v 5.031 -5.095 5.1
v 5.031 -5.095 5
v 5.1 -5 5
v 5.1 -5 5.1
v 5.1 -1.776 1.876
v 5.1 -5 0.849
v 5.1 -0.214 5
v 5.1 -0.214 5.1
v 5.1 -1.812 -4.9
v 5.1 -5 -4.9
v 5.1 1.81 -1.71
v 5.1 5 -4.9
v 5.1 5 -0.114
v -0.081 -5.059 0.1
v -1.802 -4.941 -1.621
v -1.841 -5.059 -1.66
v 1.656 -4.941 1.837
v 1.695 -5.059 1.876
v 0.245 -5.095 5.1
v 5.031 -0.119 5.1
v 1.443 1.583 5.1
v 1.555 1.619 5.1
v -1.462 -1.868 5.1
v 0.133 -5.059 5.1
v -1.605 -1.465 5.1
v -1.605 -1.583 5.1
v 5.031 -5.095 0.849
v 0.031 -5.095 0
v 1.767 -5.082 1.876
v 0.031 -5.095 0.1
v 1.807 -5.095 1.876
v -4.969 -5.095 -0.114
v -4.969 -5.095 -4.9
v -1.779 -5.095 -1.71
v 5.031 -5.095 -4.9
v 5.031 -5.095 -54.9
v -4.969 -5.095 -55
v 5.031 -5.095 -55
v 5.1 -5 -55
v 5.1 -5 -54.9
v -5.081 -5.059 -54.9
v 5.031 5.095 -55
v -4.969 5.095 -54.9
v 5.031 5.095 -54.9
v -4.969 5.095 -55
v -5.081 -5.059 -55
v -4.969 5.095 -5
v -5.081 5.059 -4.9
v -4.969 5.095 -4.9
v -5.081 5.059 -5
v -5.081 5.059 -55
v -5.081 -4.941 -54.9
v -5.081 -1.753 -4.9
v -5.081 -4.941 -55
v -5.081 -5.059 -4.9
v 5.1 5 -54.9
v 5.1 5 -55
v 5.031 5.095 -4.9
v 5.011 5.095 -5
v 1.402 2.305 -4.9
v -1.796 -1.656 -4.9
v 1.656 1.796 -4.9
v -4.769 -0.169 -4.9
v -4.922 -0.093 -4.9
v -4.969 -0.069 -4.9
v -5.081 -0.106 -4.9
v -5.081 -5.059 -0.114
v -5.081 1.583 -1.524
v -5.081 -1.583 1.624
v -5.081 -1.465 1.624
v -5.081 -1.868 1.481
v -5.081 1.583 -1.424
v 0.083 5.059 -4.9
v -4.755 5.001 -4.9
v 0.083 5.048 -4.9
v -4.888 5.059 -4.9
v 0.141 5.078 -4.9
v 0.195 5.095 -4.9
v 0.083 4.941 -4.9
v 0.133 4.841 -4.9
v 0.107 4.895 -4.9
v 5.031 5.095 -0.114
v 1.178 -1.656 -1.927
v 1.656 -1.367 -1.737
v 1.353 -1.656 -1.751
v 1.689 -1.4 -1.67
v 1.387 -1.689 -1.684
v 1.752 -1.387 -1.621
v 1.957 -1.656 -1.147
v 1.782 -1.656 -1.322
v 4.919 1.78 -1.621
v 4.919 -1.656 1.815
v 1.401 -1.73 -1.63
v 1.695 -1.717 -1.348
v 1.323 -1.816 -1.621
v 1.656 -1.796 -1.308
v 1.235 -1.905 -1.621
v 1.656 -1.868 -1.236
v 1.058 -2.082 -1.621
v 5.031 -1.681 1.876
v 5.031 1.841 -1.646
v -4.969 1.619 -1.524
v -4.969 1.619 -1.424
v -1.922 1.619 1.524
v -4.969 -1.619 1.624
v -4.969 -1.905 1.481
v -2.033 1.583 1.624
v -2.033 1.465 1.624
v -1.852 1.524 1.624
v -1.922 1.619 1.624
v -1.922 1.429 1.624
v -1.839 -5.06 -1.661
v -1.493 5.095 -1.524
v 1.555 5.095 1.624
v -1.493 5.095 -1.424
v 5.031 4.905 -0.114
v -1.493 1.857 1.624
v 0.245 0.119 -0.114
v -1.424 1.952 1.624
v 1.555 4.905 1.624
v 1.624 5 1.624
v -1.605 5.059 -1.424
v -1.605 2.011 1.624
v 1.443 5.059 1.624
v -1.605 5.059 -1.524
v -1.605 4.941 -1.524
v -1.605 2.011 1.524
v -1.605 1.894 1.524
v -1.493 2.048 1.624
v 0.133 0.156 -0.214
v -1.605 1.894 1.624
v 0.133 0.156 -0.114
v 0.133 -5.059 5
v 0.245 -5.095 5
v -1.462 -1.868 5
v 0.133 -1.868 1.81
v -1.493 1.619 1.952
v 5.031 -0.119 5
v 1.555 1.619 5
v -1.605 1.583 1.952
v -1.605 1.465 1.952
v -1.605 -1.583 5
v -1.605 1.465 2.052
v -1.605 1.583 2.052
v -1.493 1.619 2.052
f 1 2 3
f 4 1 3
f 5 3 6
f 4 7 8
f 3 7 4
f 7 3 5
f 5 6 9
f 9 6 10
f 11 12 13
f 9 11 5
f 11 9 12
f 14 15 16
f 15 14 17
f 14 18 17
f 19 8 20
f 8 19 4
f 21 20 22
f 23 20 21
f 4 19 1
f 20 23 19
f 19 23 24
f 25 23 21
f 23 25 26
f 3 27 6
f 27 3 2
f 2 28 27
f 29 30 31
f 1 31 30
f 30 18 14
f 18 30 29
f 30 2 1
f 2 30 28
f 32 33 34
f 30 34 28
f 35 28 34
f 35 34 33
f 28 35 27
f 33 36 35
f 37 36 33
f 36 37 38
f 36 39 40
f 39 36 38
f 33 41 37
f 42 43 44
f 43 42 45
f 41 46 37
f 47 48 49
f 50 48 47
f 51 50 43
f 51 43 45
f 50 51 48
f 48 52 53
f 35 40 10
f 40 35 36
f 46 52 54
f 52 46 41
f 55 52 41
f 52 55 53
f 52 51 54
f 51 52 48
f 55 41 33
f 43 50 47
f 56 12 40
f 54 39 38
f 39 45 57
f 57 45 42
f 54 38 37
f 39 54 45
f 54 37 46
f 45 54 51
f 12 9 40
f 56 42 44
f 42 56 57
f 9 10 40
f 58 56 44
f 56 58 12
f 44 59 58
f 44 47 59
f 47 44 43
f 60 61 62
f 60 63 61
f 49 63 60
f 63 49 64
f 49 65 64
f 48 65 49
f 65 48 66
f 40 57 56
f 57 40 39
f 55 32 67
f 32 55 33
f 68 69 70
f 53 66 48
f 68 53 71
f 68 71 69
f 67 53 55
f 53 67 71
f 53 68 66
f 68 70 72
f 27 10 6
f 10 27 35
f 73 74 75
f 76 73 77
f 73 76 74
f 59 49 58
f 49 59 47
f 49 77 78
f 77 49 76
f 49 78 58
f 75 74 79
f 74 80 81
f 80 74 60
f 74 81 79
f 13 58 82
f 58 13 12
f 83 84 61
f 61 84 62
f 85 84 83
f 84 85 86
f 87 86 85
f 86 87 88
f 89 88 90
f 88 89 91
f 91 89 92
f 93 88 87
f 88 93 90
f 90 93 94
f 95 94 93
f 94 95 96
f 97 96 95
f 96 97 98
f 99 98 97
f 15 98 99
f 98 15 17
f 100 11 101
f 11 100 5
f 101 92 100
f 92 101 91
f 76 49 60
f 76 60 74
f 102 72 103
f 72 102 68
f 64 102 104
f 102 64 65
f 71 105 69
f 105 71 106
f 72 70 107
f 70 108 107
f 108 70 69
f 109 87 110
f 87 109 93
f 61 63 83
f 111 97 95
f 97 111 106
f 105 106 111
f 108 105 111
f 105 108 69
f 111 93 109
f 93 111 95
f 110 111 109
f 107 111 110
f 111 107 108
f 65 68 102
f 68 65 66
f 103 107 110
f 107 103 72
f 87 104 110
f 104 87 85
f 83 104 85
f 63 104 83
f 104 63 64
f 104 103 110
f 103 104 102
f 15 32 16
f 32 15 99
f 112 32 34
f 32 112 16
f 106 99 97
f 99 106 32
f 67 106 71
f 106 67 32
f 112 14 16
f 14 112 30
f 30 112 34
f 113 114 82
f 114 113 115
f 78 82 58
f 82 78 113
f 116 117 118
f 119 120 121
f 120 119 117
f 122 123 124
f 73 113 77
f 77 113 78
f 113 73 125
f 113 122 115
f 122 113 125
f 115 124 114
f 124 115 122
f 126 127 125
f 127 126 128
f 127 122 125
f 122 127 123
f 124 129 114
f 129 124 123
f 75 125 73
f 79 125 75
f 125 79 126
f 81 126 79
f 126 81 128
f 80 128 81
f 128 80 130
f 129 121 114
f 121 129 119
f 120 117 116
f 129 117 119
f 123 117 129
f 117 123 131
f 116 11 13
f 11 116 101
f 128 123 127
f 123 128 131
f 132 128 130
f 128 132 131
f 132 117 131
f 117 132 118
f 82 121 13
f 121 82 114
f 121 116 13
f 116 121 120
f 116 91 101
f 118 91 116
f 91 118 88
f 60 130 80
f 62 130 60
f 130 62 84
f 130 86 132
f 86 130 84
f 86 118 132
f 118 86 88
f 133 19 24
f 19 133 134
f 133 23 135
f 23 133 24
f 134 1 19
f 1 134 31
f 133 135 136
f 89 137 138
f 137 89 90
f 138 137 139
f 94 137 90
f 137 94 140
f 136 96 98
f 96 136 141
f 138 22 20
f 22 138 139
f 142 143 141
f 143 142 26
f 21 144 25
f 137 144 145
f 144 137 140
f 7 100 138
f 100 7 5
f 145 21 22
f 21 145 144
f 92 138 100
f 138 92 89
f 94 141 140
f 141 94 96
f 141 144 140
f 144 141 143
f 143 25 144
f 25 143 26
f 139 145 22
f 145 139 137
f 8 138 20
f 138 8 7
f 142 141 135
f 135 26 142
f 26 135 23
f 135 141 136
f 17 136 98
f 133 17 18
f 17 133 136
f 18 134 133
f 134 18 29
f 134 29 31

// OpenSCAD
// OpenSCAD 为免费开源的跨平台建模软件
// 作者：上海市第三女子初级中学 谢丁
a = 10; // 立方体的边长
e = 0.35; // 咬合面距离调整，数值越小，咬合精度越高
length = norm([a, a, a]); // 欧氏距离
b = acos(a / length); // 倾斜角
c = atan2(a, a);    // 方位角

minkowski()
{ // 倒角
  // 为方便将来3D打印，调整角度
  rotate([-90, 0, 0]) rotate([-c, 0, 0]) rotate([0, 0, b])
  {
    for (i = [1:3]) // 循环三次
    {
      rotate([i * 120, 0, 0]) // 每隔120°生成一个正三棱柱结构
      intersection() // 相交布尔运算
      {
        difference() // 相减布尔运算
        {
          rotate([0, -c, 90 - b]) cube([a, a, a], center = true); // 原始立方体
          translate([-length / 3, 0, 0]) cube([sqrt(3)*a / 3, sqrt(3)*a, sqrt(3)*a], center = true); // 左侧的立方体结构
          translate([length / 3, 0, 0]) cube([sqrt(3)*a / 3, sqrt(3)*a, sqrt(3)*a], center = true); // 右侧的立方体结构
        }
        // 正三棱柱结构
        translate([0, sqrt(3)*a / 2 + e, 0]) rotate([30, 0, 0]) rotate([0, 90, 0]) cylinder(h = sqrt(3) * a / 3, r = sqrt(3) * a / 2, $fn = 3, center = true);
      }
    }
    // 接触面榫头基座
    intersection()
    {
      rotate([0, -c, 90 - b]) cube([a, a, a], center = true);
      translate([length / 3, 0, 0]) cube([sqrt(3)*a / 3, sqrt(3)*a, sqrt(3)*a], center = true);
    }
    translate([sqrt(3)*a / 2, 0, 0]) rotate([0, -c, 90 - b]) cube([5 * a, a, a], center = false); // 5*a 为柄长
  }
  cylinder(r = 0.1, h = 0.1); // r 和 h不同 会有不同的效果，但是底面棱没有圆倒角
}
